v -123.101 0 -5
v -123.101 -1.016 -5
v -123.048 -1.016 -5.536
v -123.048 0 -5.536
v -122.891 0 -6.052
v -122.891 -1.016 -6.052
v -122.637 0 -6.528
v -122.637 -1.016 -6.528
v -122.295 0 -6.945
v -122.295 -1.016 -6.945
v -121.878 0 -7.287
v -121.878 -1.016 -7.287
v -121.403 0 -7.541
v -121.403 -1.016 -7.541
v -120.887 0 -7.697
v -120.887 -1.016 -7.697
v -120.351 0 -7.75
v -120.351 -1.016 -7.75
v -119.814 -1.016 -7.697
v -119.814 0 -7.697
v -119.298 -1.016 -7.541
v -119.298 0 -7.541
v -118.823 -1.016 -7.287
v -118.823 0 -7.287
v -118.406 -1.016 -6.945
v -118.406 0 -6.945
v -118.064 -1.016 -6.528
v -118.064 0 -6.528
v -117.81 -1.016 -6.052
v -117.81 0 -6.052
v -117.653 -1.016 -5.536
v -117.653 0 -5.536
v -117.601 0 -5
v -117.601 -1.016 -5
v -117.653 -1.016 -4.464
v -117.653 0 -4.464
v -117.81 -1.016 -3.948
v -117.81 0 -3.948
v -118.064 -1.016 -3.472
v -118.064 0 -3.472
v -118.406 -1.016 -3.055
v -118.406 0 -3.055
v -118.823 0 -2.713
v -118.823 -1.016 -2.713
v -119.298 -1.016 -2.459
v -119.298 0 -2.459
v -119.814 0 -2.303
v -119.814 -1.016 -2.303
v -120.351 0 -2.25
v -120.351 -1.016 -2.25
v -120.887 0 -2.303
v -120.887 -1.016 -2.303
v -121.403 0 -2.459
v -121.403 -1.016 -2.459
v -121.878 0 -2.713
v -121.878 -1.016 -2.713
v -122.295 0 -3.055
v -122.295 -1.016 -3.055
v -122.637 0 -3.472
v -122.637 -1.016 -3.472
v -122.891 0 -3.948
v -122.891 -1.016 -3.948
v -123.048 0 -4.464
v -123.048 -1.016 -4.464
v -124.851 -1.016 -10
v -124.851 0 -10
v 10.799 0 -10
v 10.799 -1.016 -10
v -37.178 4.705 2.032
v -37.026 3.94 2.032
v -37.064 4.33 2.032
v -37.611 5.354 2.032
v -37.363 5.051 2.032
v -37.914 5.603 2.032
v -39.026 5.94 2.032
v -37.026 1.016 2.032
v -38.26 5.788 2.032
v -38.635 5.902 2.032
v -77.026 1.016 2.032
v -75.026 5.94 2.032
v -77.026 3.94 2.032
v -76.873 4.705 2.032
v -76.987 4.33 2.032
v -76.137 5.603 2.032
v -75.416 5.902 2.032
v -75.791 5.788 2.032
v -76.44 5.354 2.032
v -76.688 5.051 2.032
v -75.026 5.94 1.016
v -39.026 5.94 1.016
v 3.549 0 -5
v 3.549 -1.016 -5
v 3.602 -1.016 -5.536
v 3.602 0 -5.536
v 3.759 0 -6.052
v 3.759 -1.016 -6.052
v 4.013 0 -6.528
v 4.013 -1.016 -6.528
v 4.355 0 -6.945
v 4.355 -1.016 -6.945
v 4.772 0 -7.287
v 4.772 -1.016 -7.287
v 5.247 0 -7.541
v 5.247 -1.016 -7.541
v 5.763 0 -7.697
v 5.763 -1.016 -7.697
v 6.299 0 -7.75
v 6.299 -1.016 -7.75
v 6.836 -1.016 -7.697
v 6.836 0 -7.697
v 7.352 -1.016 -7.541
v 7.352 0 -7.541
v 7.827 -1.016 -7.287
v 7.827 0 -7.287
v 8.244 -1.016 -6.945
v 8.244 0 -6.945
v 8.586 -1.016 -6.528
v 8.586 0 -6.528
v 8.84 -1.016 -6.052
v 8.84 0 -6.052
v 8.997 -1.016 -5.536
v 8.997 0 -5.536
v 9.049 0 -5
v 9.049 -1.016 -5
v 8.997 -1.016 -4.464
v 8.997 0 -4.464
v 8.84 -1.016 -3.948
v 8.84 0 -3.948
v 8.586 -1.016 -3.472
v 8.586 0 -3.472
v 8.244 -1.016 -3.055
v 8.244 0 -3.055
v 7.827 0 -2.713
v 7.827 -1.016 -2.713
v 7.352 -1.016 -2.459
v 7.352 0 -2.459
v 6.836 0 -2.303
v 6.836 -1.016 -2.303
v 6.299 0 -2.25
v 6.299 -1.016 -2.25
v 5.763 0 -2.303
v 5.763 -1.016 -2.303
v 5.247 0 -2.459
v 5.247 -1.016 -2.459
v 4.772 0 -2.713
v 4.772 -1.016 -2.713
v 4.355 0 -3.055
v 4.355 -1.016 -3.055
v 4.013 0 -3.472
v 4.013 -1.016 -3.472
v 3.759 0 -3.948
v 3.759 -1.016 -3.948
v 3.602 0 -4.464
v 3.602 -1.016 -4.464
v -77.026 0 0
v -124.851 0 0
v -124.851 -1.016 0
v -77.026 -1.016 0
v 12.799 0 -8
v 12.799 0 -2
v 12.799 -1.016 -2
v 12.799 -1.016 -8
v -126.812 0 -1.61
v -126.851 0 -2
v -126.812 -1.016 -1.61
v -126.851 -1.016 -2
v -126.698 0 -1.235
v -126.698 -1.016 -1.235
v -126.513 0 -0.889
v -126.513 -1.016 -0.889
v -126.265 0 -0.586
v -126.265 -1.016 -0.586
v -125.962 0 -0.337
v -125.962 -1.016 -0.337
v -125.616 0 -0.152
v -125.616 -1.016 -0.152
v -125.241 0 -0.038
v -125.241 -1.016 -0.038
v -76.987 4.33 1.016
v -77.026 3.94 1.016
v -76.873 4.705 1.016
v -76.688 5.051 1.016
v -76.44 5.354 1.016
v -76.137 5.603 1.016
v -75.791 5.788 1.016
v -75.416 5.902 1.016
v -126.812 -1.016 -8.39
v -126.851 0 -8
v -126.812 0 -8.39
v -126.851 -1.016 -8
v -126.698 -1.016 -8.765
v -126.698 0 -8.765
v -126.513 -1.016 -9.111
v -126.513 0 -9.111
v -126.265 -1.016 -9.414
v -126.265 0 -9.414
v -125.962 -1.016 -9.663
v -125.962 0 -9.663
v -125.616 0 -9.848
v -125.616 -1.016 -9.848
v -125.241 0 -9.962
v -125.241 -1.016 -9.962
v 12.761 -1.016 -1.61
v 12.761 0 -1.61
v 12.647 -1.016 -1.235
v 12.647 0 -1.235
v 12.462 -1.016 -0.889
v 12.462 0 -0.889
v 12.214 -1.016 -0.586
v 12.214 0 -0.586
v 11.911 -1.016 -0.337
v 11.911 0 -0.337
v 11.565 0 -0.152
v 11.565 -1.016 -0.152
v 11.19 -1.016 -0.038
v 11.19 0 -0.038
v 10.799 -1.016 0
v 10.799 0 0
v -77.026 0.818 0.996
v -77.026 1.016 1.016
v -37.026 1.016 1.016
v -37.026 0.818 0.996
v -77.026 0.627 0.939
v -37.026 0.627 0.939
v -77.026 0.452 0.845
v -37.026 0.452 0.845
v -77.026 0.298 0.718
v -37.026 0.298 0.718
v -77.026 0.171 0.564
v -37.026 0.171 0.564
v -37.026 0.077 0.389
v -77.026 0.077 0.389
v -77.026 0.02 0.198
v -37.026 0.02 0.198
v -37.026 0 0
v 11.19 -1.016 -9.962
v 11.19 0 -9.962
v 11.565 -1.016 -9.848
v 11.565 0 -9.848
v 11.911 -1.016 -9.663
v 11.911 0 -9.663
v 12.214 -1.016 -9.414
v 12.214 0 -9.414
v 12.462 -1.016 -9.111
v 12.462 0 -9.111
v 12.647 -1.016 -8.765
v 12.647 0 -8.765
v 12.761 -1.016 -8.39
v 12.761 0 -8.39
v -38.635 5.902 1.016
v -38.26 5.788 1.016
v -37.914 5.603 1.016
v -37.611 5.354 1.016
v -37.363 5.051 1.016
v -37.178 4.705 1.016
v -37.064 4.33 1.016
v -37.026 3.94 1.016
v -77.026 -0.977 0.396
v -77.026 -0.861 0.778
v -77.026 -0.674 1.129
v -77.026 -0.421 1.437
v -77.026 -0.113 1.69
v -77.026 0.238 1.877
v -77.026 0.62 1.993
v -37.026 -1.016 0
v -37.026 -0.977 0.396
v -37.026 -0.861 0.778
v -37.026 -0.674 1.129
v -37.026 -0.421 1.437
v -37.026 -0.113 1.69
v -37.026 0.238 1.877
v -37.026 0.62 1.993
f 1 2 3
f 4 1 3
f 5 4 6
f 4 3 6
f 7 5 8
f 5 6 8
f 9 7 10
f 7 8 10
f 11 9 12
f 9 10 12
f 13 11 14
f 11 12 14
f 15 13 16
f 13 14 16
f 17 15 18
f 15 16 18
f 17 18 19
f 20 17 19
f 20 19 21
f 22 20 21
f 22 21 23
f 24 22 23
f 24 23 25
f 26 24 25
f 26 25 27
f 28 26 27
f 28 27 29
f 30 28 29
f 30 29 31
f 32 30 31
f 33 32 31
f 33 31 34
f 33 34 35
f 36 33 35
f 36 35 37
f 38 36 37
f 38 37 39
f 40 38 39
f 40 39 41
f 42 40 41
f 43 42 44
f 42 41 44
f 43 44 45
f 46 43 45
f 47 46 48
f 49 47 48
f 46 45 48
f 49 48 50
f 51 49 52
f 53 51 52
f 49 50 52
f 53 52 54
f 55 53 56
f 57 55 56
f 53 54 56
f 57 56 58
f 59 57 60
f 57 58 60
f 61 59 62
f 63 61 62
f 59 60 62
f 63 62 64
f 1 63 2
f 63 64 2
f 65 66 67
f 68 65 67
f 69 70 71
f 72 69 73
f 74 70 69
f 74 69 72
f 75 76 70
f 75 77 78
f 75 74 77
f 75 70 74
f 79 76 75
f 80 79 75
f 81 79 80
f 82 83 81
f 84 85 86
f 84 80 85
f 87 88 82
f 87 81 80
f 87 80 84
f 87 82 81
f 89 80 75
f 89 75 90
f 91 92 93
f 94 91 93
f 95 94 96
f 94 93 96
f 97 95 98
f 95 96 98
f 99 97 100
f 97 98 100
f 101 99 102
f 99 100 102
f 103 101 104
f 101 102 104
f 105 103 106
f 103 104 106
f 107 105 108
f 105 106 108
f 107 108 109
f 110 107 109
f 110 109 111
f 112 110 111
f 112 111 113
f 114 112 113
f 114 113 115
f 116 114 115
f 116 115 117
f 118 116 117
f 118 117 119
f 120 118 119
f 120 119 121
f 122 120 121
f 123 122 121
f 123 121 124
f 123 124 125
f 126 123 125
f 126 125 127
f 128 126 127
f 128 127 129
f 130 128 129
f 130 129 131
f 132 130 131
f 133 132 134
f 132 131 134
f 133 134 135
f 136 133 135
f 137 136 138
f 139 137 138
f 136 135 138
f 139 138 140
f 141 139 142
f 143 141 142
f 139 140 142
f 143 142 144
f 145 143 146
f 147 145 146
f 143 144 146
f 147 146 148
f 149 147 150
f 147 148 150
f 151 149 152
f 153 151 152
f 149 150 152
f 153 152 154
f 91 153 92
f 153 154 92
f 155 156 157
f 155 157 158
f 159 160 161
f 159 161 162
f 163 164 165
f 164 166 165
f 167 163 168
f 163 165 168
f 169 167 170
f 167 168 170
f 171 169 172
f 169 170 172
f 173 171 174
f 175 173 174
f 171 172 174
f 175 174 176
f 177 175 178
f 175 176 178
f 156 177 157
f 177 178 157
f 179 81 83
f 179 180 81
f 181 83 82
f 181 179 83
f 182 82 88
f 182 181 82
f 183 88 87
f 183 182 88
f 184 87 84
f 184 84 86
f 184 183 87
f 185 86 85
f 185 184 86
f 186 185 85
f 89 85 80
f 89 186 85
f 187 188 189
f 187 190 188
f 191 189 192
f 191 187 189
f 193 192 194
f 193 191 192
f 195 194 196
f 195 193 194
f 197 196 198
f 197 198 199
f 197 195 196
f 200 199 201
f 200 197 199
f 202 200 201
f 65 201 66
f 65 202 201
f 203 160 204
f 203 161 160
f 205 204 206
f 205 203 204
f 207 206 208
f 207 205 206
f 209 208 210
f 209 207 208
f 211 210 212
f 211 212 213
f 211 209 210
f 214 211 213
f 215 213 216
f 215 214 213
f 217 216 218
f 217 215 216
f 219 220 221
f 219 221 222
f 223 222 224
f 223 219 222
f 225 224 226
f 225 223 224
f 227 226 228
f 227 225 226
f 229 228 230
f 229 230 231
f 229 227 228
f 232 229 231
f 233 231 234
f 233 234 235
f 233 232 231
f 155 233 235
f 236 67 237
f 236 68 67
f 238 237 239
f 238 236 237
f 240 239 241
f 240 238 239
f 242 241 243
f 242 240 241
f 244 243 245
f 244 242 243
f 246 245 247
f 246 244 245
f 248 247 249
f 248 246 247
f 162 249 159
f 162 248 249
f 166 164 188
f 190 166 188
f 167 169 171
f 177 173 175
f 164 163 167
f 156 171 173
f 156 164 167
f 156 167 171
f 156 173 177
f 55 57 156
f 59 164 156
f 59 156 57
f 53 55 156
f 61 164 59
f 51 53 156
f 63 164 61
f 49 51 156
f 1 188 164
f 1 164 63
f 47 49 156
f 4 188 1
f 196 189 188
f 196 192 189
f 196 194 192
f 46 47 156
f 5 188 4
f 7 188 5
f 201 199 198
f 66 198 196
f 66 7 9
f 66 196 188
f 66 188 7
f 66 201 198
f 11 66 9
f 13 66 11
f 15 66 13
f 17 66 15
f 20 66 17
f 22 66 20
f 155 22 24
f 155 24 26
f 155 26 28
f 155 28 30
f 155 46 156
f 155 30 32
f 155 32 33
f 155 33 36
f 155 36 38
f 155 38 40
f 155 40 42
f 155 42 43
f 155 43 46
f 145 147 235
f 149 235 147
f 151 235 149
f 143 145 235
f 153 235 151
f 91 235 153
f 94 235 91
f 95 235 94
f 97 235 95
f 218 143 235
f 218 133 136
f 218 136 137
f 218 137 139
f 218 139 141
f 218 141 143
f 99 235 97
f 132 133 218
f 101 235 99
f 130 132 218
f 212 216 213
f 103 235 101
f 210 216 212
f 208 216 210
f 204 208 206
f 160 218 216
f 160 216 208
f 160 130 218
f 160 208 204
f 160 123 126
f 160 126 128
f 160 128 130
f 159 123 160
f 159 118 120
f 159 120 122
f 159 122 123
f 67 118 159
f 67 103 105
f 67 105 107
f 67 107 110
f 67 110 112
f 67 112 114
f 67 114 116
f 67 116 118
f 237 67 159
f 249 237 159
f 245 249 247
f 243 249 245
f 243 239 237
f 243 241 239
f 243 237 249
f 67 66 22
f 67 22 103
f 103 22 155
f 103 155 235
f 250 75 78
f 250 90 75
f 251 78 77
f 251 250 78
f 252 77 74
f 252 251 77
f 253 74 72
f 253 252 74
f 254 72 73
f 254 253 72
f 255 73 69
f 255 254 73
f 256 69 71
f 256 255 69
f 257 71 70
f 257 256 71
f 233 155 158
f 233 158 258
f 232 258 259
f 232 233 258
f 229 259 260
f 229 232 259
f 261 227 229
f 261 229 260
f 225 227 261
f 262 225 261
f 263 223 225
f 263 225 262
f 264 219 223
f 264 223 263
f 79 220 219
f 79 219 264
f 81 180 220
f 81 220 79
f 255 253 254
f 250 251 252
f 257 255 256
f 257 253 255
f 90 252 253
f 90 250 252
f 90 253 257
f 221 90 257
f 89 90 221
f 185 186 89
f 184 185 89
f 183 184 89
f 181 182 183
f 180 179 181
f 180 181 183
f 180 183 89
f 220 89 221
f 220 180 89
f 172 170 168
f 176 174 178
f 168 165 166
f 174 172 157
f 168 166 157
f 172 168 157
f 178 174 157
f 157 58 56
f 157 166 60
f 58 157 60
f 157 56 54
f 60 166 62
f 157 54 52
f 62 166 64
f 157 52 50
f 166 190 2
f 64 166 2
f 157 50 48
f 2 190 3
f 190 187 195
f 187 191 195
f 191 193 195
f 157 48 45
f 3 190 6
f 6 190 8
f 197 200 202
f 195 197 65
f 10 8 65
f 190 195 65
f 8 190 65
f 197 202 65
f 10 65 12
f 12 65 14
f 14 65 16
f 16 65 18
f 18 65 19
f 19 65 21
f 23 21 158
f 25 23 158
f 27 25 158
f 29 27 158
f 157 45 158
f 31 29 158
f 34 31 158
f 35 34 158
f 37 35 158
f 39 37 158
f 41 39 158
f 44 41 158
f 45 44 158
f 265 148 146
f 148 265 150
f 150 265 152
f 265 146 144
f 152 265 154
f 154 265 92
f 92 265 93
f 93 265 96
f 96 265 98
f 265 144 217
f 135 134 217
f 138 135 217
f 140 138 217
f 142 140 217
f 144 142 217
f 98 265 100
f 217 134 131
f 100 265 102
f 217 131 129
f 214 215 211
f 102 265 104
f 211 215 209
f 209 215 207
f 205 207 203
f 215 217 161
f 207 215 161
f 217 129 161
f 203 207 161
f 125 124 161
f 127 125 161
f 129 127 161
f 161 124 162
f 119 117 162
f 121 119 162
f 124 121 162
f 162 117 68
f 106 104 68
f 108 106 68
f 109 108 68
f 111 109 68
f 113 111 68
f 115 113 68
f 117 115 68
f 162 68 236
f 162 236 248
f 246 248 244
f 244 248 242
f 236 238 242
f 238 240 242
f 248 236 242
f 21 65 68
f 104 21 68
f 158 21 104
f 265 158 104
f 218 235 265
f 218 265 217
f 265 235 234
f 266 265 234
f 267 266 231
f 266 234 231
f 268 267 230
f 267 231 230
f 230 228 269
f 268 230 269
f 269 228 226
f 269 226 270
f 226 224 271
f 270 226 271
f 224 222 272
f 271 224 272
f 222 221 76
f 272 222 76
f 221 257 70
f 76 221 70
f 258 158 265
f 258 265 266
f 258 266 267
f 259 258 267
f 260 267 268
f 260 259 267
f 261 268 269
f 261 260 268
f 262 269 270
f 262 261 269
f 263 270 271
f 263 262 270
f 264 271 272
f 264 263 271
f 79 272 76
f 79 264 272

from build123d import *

# Parameters (mm, degrees)
SKETCH1_W            = 139.65
SKETCH1_H            = 10
BASE_FLANGE1_DEPTH   = 1.016
EDGE_FLANGE1_DEPTH   = 40
FILLET1_R            = 2
M5_CLEARANCE_HOLE1_D = 5.5


# Sheet-metal steps are written as plain solids
with BuildPart() as part:
    # Sketch1 → Base-Flange1 (new body)
    with BuildSketch(Plane(origin=(0, 0, 0), x_dir=(1, 0, 0), z_dir=(0, 1, 0))):
        with Locations((-57.025509978, 5)):
            Rectangle(SKETCH1_W, SKETCH1_H)
    extrude(amount=-BASE_FLANGE1_DEPTH)

    # Edge-Flange1 section (across the edge) → Edge-Flange1 (add)
    with BuildSketch(Plane(origin=(-77.025509978, 0, 1.016), x_dir=(0, 0, -1), z_dir=(1, 0, 0))):
        with BuildLine():
            Line((-1.016, 1.016), (-1.016, 5.94))
            Line((-1.016, 5.94), (0, 5.94))
            Line((0, 5.94), (0, 1.016))
            ThreePointArc((0, 1.016), (0.29757951, 0.29757951), (1.016, 0))
            Line((1.016, 0), (1.016, -1.016))
            ThreePointArc((1.016, -1.016), (-0.420840979, -0.420840979), (-1.016, 1.016))
        make_face()
    extrude(amount=EDGE_FLANGE1_DEPTH)

    # Fillet1
    fillet1_edges = [part.edges().sort_by_distance(p)[0] for p in [
        (-77.025509978, 5.94, 1.524),
        (-37.025509978, 5.94, 1.524),
        (-126.850509978, -0.508, -10),
        (12.799490022, -0.508, -10),
        (12.799490022, -0.508, 0),
        (-126.850509978, -0.508, 0),
    ]]
    fillet(fillet1_edges, radius=FILLET1_R)

    # M5 Clearance Hole1 (through all)
    with Locations(Plane(origin=(0, 0, 0), x_dir=(1, 0, 0), z_dir=(0, 1, 0))):
        with Locations((-120.350509978, 5), (6.299490022, 5)):
            Hole(M5_CLEARANCE_HOLE1_D / 2)


solid = part.part
